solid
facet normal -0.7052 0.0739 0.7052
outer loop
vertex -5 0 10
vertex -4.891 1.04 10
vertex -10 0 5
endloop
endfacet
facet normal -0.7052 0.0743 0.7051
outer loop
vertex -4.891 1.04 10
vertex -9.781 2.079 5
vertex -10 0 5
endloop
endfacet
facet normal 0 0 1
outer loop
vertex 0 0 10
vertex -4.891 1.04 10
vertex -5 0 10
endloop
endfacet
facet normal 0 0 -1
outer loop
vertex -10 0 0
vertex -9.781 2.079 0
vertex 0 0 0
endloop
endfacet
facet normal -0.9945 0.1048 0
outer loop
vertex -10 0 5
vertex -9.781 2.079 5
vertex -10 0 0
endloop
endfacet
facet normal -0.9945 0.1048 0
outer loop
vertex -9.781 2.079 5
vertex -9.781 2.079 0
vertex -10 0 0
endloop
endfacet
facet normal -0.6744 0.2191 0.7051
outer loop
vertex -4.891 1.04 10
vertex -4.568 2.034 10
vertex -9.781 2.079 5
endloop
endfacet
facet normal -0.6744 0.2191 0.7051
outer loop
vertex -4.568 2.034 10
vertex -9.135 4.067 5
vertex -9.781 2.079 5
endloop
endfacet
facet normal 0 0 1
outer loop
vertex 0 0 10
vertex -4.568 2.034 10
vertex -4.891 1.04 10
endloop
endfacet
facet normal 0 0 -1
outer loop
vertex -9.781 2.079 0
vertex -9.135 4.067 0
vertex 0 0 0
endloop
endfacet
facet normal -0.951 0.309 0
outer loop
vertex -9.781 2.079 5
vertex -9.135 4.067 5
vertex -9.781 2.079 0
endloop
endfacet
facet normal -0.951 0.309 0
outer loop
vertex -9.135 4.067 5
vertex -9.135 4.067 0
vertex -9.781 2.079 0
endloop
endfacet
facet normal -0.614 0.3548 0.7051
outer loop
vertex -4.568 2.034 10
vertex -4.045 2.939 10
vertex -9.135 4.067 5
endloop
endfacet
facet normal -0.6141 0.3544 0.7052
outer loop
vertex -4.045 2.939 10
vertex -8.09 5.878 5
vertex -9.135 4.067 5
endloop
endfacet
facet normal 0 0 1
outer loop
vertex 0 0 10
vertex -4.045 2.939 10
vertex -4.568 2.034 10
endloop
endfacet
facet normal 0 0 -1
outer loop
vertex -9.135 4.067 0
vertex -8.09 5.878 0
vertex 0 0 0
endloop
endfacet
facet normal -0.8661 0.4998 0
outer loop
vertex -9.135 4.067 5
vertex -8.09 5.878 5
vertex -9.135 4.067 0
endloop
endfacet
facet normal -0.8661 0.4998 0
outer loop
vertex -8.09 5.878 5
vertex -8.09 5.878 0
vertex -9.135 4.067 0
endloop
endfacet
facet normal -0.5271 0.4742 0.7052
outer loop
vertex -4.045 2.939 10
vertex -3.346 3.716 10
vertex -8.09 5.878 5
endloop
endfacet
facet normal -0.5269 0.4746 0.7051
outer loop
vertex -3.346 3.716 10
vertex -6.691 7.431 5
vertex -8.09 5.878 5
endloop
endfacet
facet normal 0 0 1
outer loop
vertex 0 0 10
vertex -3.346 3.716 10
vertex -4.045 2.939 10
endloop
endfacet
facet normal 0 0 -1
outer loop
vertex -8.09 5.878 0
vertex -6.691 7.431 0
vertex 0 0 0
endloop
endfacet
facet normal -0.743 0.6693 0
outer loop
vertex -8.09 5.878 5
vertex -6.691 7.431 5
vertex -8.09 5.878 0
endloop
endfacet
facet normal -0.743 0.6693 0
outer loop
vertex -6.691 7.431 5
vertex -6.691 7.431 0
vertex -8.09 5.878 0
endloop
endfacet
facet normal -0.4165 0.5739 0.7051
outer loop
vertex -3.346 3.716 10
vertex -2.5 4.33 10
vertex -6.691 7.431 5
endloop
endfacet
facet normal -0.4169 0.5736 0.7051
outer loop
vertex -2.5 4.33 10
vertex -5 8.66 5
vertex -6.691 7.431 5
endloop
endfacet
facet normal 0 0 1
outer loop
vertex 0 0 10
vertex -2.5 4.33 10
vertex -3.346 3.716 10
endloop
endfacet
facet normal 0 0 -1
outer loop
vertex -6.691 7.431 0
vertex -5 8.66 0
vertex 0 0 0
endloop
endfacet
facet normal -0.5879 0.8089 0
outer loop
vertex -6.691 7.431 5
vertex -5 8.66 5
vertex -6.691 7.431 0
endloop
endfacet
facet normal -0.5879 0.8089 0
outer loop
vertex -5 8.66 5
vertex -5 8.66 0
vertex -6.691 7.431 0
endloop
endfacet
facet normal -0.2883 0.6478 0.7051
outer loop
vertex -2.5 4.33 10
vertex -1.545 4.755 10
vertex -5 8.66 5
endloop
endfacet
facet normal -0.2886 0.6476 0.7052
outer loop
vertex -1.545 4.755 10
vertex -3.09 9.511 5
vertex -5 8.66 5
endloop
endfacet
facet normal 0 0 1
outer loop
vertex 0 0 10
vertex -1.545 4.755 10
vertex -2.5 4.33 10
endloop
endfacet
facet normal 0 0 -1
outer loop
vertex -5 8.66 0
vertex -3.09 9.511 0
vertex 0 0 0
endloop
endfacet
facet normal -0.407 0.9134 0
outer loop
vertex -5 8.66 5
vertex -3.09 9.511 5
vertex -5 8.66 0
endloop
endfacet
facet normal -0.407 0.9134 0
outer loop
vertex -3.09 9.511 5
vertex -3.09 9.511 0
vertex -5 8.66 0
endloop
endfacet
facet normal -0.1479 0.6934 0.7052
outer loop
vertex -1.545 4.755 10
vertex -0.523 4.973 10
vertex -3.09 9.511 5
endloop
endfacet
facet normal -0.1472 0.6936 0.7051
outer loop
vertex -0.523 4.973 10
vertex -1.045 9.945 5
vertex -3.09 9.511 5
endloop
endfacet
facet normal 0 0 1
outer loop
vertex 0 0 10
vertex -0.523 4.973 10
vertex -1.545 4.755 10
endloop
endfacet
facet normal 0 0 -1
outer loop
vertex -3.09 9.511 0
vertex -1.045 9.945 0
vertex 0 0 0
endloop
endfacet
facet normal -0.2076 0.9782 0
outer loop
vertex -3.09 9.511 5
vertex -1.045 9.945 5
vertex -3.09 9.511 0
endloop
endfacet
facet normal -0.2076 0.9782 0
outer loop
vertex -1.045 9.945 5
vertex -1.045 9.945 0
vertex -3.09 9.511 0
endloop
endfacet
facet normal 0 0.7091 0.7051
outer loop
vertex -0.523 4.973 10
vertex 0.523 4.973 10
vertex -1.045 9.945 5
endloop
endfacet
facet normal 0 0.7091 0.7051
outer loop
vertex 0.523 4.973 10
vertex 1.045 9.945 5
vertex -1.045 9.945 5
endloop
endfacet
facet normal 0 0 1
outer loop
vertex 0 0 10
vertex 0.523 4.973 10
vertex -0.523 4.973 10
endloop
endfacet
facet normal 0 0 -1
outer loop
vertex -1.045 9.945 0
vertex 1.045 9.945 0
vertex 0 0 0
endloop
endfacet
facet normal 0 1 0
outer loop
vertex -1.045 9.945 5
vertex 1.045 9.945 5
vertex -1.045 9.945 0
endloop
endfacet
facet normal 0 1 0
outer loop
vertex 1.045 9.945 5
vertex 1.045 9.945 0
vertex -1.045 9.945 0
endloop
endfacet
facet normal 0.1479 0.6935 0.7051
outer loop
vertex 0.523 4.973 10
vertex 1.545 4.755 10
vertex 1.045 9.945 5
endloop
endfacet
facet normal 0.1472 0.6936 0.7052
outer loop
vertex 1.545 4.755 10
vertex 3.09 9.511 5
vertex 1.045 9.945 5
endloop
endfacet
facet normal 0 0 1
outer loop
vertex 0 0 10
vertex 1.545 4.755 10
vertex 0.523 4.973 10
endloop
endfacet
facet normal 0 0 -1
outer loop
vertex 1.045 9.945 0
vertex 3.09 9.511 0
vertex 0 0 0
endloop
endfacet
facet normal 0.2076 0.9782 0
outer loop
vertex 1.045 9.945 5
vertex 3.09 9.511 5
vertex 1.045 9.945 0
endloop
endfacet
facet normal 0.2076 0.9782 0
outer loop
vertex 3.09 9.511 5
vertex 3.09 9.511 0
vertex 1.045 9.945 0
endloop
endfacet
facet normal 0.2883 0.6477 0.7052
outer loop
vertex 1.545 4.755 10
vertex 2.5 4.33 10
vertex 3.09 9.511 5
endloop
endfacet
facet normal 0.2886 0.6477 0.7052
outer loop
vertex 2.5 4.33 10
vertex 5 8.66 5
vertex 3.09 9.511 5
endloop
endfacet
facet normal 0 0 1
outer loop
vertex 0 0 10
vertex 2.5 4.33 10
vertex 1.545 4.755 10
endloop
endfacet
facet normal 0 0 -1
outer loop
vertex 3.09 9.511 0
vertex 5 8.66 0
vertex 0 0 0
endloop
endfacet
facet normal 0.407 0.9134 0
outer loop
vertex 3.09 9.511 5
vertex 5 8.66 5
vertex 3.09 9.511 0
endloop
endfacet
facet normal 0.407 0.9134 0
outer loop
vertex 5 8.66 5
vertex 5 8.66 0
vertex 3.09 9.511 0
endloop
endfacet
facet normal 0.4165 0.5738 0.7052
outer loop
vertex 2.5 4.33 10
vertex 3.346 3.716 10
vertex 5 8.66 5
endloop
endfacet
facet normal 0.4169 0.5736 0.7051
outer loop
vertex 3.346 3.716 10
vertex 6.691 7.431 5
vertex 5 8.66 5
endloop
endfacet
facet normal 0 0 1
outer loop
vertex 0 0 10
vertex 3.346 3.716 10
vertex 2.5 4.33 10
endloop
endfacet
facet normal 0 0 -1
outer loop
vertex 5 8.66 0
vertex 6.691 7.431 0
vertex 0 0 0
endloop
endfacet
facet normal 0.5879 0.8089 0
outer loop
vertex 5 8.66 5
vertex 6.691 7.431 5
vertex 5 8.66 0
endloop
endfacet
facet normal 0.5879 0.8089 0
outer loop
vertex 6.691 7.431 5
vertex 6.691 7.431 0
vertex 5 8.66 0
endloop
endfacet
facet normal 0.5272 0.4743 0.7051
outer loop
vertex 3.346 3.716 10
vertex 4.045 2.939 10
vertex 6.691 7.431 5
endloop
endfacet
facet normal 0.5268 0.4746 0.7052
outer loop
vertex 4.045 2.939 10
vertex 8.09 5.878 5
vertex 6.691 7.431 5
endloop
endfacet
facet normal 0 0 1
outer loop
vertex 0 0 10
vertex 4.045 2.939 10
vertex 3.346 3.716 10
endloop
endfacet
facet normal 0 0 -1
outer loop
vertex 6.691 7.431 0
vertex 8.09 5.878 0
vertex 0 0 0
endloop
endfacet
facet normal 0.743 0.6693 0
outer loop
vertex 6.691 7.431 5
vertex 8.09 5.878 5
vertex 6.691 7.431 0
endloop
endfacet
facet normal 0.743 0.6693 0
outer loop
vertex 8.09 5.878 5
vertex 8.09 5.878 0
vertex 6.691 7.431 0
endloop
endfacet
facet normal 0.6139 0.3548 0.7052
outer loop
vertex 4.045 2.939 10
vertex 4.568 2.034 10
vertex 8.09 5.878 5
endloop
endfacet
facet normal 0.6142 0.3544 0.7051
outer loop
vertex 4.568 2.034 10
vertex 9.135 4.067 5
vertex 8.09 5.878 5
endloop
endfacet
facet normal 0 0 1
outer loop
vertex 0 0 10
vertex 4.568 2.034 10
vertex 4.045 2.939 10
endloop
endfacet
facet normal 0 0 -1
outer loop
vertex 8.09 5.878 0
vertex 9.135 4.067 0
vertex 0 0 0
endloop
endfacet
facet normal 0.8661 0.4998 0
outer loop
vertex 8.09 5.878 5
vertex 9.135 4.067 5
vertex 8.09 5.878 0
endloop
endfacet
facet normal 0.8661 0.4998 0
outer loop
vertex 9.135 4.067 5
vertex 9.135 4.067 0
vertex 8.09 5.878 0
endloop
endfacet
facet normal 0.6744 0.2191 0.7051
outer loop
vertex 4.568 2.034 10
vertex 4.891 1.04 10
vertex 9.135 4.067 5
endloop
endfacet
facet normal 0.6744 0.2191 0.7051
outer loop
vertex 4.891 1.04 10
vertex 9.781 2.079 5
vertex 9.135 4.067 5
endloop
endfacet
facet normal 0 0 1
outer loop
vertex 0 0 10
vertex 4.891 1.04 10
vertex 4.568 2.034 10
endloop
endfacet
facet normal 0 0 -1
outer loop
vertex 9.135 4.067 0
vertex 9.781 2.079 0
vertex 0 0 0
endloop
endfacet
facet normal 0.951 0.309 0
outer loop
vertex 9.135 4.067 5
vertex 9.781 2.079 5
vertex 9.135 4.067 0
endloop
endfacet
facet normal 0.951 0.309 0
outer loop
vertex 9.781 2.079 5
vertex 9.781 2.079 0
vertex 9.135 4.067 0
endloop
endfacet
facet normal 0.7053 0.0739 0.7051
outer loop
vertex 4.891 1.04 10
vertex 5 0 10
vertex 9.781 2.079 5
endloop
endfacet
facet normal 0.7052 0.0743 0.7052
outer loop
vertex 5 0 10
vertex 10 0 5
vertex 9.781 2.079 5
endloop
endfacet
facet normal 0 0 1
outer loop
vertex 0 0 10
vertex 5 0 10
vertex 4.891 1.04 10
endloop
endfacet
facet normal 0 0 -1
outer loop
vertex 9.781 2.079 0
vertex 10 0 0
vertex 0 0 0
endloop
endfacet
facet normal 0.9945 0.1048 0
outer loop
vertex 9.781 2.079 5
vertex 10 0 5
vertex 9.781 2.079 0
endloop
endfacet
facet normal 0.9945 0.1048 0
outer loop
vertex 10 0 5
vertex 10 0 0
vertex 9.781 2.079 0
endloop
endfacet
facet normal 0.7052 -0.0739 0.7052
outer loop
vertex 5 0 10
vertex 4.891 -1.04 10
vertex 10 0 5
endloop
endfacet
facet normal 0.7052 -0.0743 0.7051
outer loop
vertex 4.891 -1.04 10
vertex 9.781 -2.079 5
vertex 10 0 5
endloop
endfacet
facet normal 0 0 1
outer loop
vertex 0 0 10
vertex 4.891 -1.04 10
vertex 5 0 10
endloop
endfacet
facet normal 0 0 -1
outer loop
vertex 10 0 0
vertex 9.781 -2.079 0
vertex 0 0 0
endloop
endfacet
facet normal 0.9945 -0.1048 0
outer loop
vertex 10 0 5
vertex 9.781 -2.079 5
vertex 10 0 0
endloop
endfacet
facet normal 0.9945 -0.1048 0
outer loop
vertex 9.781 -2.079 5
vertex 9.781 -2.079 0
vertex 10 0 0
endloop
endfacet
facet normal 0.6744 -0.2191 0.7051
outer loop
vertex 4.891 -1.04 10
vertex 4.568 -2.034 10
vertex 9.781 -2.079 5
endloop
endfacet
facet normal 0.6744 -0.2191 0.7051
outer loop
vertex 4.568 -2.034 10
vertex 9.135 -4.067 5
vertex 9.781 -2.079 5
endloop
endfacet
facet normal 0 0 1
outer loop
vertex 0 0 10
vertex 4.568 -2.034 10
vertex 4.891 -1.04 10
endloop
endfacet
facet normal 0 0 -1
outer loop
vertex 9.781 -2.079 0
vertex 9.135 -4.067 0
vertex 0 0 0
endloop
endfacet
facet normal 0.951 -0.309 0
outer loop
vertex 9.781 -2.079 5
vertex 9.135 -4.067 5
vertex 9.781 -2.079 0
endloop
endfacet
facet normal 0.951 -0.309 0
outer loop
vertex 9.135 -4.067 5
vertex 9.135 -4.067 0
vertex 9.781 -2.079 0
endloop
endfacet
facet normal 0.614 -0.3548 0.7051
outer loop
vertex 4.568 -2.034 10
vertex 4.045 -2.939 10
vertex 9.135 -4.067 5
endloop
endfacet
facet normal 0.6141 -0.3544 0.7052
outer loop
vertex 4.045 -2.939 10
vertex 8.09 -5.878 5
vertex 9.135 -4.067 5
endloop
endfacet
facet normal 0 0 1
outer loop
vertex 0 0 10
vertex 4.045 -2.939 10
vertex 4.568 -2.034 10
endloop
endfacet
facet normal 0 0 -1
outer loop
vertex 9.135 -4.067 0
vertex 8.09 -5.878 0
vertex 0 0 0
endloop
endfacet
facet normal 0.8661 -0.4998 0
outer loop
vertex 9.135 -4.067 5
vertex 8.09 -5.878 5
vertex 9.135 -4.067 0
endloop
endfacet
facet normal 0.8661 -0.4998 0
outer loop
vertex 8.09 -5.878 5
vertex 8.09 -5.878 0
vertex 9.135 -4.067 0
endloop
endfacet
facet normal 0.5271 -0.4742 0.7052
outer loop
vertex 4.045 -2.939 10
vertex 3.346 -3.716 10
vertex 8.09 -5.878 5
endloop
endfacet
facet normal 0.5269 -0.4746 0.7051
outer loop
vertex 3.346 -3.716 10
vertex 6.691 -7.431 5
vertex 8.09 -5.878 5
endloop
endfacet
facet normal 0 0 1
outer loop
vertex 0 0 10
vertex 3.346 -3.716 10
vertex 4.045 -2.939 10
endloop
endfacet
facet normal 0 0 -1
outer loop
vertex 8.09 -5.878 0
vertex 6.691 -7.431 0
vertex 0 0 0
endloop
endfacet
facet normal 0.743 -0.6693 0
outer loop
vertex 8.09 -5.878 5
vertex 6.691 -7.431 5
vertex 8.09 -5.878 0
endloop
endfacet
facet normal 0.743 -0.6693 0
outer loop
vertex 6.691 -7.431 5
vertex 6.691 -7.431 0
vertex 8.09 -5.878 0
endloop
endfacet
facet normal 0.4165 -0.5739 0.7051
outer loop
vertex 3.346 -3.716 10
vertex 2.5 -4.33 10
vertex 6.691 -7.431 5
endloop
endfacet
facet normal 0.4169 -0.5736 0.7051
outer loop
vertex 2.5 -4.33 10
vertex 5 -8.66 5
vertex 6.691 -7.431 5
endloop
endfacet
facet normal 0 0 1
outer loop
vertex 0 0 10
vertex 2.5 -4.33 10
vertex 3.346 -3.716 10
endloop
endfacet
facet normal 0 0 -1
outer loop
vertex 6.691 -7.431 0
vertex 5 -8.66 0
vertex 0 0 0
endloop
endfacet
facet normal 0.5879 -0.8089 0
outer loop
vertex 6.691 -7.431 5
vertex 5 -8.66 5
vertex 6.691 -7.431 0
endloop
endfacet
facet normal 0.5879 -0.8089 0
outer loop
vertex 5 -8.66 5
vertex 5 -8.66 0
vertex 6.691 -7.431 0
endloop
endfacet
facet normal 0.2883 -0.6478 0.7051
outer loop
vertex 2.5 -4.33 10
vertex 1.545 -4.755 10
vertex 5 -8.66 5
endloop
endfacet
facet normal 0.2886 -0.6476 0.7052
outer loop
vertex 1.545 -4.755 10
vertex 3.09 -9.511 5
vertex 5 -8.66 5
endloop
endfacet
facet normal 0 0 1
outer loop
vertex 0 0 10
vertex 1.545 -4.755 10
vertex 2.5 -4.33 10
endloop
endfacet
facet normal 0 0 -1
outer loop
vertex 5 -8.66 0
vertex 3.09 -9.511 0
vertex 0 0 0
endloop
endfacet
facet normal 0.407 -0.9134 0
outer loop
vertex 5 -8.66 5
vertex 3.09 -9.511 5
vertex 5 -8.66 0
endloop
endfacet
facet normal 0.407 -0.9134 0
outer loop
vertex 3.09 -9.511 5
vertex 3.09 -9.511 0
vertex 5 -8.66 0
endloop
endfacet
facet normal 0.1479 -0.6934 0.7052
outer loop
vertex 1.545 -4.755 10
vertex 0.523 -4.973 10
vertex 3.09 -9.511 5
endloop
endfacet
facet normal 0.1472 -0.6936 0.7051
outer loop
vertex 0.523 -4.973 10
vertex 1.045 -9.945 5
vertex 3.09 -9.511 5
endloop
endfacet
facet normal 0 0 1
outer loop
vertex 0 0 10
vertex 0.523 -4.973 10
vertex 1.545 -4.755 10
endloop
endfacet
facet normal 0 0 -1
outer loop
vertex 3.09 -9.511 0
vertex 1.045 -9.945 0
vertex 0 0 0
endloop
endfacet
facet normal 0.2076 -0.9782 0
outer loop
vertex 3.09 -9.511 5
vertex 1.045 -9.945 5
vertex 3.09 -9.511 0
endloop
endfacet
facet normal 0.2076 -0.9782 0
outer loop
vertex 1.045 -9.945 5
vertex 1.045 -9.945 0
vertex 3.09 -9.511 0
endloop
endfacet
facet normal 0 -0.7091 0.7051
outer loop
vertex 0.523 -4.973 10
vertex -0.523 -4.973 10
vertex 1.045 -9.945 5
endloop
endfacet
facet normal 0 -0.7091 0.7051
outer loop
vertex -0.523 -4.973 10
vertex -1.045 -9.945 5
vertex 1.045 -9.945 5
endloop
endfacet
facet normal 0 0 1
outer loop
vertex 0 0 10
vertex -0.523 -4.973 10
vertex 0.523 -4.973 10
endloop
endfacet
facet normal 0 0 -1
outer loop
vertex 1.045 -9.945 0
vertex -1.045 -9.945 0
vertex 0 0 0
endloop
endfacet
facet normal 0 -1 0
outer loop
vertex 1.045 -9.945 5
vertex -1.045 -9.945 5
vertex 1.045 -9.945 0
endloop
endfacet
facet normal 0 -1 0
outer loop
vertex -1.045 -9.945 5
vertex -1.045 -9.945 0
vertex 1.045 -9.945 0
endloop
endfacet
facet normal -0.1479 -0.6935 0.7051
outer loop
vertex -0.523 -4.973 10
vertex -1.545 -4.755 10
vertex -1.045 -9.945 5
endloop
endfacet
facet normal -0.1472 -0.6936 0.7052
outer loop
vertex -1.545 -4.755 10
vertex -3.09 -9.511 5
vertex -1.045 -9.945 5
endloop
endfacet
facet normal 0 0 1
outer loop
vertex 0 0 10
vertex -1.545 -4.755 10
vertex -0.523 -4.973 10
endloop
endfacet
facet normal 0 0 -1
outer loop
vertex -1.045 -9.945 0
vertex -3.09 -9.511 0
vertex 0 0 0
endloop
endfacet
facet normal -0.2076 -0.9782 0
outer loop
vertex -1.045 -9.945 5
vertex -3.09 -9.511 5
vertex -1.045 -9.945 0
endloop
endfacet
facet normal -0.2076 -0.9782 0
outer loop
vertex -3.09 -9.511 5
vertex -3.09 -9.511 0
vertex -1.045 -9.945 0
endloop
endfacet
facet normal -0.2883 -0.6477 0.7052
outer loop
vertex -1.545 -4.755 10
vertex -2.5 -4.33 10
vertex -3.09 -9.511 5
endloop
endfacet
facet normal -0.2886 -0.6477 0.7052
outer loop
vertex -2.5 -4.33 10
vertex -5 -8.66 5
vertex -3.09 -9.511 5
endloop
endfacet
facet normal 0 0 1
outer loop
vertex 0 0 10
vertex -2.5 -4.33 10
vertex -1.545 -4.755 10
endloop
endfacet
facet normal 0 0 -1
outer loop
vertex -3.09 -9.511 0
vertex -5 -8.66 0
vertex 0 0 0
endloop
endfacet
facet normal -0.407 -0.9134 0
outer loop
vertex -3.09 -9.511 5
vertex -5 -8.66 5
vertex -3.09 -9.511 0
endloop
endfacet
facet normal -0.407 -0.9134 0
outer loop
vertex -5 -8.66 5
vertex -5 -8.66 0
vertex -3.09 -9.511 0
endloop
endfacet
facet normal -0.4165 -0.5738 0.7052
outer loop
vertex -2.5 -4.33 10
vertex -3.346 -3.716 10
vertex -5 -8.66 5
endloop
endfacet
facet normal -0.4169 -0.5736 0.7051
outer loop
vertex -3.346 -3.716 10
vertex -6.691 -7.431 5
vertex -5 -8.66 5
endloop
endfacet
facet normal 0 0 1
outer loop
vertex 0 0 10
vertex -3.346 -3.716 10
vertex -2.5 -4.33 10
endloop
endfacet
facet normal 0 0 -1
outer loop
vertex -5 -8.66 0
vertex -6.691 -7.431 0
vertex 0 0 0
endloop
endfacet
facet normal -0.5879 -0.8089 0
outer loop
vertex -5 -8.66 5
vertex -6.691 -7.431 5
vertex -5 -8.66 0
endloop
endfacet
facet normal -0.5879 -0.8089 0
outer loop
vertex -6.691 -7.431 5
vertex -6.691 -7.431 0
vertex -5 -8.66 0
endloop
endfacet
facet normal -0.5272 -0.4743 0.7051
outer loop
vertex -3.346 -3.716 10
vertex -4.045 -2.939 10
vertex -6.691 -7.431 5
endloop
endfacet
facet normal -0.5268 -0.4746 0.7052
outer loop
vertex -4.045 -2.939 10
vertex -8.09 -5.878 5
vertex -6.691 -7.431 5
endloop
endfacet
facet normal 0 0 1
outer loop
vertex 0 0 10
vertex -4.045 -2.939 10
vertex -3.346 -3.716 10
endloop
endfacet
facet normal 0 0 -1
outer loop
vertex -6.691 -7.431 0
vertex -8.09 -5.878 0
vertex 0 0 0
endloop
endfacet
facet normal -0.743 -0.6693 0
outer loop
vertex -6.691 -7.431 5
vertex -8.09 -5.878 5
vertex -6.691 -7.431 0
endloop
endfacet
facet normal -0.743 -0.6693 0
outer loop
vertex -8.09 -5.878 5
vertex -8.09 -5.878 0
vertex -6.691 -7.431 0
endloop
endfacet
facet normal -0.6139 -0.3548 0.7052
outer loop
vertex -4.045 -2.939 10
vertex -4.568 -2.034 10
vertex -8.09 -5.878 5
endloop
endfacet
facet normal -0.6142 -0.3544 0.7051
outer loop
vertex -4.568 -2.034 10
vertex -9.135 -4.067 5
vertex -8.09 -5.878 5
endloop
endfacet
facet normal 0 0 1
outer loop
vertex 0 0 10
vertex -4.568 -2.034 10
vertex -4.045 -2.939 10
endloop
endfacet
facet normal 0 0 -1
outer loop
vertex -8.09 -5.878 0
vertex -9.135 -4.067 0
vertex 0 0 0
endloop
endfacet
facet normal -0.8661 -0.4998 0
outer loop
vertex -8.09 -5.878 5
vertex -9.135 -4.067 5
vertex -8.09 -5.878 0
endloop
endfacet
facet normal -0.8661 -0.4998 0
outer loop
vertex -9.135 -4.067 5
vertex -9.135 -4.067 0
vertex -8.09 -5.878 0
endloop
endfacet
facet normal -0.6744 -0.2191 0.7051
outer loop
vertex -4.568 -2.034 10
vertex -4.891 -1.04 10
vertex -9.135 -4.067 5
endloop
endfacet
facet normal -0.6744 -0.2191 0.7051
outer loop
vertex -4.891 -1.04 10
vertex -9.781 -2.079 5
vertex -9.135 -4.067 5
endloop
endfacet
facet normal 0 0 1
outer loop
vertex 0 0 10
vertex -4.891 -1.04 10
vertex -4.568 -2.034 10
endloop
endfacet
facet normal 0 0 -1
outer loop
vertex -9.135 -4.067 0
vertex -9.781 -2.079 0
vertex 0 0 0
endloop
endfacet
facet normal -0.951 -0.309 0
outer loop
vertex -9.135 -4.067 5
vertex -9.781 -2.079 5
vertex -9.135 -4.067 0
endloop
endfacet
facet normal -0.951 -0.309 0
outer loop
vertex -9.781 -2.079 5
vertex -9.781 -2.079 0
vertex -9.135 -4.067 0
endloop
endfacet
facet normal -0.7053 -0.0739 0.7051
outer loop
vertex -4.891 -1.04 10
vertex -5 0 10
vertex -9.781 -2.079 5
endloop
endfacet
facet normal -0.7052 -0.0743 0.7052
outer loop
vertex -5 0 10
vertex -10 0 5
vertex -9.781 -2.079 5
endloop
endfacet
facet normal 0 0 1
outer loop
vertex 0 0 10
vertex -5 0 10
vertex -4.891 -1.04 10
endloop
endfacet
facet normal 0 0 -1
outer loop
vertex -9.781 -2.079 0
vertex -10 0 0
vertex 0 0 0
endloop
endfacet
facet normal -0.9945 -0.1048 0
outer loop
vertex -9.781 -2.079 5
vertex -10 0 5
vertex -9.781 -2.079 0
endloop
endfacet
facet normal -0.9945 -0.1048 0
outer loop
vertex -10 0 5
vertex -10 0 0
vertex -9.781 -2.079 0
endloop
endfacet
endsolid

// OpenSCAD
// Stage 2 of docs/audits/exact-geometry-rust.md: extrusions.
// A revolved polygon: a cylinder, a cone and two annuli.
// volume: 2487.0941840919195
rotate_extrude() polygon([[0, 0], [10, 0], [10, 5], [5, 10], [0, 10]]);
